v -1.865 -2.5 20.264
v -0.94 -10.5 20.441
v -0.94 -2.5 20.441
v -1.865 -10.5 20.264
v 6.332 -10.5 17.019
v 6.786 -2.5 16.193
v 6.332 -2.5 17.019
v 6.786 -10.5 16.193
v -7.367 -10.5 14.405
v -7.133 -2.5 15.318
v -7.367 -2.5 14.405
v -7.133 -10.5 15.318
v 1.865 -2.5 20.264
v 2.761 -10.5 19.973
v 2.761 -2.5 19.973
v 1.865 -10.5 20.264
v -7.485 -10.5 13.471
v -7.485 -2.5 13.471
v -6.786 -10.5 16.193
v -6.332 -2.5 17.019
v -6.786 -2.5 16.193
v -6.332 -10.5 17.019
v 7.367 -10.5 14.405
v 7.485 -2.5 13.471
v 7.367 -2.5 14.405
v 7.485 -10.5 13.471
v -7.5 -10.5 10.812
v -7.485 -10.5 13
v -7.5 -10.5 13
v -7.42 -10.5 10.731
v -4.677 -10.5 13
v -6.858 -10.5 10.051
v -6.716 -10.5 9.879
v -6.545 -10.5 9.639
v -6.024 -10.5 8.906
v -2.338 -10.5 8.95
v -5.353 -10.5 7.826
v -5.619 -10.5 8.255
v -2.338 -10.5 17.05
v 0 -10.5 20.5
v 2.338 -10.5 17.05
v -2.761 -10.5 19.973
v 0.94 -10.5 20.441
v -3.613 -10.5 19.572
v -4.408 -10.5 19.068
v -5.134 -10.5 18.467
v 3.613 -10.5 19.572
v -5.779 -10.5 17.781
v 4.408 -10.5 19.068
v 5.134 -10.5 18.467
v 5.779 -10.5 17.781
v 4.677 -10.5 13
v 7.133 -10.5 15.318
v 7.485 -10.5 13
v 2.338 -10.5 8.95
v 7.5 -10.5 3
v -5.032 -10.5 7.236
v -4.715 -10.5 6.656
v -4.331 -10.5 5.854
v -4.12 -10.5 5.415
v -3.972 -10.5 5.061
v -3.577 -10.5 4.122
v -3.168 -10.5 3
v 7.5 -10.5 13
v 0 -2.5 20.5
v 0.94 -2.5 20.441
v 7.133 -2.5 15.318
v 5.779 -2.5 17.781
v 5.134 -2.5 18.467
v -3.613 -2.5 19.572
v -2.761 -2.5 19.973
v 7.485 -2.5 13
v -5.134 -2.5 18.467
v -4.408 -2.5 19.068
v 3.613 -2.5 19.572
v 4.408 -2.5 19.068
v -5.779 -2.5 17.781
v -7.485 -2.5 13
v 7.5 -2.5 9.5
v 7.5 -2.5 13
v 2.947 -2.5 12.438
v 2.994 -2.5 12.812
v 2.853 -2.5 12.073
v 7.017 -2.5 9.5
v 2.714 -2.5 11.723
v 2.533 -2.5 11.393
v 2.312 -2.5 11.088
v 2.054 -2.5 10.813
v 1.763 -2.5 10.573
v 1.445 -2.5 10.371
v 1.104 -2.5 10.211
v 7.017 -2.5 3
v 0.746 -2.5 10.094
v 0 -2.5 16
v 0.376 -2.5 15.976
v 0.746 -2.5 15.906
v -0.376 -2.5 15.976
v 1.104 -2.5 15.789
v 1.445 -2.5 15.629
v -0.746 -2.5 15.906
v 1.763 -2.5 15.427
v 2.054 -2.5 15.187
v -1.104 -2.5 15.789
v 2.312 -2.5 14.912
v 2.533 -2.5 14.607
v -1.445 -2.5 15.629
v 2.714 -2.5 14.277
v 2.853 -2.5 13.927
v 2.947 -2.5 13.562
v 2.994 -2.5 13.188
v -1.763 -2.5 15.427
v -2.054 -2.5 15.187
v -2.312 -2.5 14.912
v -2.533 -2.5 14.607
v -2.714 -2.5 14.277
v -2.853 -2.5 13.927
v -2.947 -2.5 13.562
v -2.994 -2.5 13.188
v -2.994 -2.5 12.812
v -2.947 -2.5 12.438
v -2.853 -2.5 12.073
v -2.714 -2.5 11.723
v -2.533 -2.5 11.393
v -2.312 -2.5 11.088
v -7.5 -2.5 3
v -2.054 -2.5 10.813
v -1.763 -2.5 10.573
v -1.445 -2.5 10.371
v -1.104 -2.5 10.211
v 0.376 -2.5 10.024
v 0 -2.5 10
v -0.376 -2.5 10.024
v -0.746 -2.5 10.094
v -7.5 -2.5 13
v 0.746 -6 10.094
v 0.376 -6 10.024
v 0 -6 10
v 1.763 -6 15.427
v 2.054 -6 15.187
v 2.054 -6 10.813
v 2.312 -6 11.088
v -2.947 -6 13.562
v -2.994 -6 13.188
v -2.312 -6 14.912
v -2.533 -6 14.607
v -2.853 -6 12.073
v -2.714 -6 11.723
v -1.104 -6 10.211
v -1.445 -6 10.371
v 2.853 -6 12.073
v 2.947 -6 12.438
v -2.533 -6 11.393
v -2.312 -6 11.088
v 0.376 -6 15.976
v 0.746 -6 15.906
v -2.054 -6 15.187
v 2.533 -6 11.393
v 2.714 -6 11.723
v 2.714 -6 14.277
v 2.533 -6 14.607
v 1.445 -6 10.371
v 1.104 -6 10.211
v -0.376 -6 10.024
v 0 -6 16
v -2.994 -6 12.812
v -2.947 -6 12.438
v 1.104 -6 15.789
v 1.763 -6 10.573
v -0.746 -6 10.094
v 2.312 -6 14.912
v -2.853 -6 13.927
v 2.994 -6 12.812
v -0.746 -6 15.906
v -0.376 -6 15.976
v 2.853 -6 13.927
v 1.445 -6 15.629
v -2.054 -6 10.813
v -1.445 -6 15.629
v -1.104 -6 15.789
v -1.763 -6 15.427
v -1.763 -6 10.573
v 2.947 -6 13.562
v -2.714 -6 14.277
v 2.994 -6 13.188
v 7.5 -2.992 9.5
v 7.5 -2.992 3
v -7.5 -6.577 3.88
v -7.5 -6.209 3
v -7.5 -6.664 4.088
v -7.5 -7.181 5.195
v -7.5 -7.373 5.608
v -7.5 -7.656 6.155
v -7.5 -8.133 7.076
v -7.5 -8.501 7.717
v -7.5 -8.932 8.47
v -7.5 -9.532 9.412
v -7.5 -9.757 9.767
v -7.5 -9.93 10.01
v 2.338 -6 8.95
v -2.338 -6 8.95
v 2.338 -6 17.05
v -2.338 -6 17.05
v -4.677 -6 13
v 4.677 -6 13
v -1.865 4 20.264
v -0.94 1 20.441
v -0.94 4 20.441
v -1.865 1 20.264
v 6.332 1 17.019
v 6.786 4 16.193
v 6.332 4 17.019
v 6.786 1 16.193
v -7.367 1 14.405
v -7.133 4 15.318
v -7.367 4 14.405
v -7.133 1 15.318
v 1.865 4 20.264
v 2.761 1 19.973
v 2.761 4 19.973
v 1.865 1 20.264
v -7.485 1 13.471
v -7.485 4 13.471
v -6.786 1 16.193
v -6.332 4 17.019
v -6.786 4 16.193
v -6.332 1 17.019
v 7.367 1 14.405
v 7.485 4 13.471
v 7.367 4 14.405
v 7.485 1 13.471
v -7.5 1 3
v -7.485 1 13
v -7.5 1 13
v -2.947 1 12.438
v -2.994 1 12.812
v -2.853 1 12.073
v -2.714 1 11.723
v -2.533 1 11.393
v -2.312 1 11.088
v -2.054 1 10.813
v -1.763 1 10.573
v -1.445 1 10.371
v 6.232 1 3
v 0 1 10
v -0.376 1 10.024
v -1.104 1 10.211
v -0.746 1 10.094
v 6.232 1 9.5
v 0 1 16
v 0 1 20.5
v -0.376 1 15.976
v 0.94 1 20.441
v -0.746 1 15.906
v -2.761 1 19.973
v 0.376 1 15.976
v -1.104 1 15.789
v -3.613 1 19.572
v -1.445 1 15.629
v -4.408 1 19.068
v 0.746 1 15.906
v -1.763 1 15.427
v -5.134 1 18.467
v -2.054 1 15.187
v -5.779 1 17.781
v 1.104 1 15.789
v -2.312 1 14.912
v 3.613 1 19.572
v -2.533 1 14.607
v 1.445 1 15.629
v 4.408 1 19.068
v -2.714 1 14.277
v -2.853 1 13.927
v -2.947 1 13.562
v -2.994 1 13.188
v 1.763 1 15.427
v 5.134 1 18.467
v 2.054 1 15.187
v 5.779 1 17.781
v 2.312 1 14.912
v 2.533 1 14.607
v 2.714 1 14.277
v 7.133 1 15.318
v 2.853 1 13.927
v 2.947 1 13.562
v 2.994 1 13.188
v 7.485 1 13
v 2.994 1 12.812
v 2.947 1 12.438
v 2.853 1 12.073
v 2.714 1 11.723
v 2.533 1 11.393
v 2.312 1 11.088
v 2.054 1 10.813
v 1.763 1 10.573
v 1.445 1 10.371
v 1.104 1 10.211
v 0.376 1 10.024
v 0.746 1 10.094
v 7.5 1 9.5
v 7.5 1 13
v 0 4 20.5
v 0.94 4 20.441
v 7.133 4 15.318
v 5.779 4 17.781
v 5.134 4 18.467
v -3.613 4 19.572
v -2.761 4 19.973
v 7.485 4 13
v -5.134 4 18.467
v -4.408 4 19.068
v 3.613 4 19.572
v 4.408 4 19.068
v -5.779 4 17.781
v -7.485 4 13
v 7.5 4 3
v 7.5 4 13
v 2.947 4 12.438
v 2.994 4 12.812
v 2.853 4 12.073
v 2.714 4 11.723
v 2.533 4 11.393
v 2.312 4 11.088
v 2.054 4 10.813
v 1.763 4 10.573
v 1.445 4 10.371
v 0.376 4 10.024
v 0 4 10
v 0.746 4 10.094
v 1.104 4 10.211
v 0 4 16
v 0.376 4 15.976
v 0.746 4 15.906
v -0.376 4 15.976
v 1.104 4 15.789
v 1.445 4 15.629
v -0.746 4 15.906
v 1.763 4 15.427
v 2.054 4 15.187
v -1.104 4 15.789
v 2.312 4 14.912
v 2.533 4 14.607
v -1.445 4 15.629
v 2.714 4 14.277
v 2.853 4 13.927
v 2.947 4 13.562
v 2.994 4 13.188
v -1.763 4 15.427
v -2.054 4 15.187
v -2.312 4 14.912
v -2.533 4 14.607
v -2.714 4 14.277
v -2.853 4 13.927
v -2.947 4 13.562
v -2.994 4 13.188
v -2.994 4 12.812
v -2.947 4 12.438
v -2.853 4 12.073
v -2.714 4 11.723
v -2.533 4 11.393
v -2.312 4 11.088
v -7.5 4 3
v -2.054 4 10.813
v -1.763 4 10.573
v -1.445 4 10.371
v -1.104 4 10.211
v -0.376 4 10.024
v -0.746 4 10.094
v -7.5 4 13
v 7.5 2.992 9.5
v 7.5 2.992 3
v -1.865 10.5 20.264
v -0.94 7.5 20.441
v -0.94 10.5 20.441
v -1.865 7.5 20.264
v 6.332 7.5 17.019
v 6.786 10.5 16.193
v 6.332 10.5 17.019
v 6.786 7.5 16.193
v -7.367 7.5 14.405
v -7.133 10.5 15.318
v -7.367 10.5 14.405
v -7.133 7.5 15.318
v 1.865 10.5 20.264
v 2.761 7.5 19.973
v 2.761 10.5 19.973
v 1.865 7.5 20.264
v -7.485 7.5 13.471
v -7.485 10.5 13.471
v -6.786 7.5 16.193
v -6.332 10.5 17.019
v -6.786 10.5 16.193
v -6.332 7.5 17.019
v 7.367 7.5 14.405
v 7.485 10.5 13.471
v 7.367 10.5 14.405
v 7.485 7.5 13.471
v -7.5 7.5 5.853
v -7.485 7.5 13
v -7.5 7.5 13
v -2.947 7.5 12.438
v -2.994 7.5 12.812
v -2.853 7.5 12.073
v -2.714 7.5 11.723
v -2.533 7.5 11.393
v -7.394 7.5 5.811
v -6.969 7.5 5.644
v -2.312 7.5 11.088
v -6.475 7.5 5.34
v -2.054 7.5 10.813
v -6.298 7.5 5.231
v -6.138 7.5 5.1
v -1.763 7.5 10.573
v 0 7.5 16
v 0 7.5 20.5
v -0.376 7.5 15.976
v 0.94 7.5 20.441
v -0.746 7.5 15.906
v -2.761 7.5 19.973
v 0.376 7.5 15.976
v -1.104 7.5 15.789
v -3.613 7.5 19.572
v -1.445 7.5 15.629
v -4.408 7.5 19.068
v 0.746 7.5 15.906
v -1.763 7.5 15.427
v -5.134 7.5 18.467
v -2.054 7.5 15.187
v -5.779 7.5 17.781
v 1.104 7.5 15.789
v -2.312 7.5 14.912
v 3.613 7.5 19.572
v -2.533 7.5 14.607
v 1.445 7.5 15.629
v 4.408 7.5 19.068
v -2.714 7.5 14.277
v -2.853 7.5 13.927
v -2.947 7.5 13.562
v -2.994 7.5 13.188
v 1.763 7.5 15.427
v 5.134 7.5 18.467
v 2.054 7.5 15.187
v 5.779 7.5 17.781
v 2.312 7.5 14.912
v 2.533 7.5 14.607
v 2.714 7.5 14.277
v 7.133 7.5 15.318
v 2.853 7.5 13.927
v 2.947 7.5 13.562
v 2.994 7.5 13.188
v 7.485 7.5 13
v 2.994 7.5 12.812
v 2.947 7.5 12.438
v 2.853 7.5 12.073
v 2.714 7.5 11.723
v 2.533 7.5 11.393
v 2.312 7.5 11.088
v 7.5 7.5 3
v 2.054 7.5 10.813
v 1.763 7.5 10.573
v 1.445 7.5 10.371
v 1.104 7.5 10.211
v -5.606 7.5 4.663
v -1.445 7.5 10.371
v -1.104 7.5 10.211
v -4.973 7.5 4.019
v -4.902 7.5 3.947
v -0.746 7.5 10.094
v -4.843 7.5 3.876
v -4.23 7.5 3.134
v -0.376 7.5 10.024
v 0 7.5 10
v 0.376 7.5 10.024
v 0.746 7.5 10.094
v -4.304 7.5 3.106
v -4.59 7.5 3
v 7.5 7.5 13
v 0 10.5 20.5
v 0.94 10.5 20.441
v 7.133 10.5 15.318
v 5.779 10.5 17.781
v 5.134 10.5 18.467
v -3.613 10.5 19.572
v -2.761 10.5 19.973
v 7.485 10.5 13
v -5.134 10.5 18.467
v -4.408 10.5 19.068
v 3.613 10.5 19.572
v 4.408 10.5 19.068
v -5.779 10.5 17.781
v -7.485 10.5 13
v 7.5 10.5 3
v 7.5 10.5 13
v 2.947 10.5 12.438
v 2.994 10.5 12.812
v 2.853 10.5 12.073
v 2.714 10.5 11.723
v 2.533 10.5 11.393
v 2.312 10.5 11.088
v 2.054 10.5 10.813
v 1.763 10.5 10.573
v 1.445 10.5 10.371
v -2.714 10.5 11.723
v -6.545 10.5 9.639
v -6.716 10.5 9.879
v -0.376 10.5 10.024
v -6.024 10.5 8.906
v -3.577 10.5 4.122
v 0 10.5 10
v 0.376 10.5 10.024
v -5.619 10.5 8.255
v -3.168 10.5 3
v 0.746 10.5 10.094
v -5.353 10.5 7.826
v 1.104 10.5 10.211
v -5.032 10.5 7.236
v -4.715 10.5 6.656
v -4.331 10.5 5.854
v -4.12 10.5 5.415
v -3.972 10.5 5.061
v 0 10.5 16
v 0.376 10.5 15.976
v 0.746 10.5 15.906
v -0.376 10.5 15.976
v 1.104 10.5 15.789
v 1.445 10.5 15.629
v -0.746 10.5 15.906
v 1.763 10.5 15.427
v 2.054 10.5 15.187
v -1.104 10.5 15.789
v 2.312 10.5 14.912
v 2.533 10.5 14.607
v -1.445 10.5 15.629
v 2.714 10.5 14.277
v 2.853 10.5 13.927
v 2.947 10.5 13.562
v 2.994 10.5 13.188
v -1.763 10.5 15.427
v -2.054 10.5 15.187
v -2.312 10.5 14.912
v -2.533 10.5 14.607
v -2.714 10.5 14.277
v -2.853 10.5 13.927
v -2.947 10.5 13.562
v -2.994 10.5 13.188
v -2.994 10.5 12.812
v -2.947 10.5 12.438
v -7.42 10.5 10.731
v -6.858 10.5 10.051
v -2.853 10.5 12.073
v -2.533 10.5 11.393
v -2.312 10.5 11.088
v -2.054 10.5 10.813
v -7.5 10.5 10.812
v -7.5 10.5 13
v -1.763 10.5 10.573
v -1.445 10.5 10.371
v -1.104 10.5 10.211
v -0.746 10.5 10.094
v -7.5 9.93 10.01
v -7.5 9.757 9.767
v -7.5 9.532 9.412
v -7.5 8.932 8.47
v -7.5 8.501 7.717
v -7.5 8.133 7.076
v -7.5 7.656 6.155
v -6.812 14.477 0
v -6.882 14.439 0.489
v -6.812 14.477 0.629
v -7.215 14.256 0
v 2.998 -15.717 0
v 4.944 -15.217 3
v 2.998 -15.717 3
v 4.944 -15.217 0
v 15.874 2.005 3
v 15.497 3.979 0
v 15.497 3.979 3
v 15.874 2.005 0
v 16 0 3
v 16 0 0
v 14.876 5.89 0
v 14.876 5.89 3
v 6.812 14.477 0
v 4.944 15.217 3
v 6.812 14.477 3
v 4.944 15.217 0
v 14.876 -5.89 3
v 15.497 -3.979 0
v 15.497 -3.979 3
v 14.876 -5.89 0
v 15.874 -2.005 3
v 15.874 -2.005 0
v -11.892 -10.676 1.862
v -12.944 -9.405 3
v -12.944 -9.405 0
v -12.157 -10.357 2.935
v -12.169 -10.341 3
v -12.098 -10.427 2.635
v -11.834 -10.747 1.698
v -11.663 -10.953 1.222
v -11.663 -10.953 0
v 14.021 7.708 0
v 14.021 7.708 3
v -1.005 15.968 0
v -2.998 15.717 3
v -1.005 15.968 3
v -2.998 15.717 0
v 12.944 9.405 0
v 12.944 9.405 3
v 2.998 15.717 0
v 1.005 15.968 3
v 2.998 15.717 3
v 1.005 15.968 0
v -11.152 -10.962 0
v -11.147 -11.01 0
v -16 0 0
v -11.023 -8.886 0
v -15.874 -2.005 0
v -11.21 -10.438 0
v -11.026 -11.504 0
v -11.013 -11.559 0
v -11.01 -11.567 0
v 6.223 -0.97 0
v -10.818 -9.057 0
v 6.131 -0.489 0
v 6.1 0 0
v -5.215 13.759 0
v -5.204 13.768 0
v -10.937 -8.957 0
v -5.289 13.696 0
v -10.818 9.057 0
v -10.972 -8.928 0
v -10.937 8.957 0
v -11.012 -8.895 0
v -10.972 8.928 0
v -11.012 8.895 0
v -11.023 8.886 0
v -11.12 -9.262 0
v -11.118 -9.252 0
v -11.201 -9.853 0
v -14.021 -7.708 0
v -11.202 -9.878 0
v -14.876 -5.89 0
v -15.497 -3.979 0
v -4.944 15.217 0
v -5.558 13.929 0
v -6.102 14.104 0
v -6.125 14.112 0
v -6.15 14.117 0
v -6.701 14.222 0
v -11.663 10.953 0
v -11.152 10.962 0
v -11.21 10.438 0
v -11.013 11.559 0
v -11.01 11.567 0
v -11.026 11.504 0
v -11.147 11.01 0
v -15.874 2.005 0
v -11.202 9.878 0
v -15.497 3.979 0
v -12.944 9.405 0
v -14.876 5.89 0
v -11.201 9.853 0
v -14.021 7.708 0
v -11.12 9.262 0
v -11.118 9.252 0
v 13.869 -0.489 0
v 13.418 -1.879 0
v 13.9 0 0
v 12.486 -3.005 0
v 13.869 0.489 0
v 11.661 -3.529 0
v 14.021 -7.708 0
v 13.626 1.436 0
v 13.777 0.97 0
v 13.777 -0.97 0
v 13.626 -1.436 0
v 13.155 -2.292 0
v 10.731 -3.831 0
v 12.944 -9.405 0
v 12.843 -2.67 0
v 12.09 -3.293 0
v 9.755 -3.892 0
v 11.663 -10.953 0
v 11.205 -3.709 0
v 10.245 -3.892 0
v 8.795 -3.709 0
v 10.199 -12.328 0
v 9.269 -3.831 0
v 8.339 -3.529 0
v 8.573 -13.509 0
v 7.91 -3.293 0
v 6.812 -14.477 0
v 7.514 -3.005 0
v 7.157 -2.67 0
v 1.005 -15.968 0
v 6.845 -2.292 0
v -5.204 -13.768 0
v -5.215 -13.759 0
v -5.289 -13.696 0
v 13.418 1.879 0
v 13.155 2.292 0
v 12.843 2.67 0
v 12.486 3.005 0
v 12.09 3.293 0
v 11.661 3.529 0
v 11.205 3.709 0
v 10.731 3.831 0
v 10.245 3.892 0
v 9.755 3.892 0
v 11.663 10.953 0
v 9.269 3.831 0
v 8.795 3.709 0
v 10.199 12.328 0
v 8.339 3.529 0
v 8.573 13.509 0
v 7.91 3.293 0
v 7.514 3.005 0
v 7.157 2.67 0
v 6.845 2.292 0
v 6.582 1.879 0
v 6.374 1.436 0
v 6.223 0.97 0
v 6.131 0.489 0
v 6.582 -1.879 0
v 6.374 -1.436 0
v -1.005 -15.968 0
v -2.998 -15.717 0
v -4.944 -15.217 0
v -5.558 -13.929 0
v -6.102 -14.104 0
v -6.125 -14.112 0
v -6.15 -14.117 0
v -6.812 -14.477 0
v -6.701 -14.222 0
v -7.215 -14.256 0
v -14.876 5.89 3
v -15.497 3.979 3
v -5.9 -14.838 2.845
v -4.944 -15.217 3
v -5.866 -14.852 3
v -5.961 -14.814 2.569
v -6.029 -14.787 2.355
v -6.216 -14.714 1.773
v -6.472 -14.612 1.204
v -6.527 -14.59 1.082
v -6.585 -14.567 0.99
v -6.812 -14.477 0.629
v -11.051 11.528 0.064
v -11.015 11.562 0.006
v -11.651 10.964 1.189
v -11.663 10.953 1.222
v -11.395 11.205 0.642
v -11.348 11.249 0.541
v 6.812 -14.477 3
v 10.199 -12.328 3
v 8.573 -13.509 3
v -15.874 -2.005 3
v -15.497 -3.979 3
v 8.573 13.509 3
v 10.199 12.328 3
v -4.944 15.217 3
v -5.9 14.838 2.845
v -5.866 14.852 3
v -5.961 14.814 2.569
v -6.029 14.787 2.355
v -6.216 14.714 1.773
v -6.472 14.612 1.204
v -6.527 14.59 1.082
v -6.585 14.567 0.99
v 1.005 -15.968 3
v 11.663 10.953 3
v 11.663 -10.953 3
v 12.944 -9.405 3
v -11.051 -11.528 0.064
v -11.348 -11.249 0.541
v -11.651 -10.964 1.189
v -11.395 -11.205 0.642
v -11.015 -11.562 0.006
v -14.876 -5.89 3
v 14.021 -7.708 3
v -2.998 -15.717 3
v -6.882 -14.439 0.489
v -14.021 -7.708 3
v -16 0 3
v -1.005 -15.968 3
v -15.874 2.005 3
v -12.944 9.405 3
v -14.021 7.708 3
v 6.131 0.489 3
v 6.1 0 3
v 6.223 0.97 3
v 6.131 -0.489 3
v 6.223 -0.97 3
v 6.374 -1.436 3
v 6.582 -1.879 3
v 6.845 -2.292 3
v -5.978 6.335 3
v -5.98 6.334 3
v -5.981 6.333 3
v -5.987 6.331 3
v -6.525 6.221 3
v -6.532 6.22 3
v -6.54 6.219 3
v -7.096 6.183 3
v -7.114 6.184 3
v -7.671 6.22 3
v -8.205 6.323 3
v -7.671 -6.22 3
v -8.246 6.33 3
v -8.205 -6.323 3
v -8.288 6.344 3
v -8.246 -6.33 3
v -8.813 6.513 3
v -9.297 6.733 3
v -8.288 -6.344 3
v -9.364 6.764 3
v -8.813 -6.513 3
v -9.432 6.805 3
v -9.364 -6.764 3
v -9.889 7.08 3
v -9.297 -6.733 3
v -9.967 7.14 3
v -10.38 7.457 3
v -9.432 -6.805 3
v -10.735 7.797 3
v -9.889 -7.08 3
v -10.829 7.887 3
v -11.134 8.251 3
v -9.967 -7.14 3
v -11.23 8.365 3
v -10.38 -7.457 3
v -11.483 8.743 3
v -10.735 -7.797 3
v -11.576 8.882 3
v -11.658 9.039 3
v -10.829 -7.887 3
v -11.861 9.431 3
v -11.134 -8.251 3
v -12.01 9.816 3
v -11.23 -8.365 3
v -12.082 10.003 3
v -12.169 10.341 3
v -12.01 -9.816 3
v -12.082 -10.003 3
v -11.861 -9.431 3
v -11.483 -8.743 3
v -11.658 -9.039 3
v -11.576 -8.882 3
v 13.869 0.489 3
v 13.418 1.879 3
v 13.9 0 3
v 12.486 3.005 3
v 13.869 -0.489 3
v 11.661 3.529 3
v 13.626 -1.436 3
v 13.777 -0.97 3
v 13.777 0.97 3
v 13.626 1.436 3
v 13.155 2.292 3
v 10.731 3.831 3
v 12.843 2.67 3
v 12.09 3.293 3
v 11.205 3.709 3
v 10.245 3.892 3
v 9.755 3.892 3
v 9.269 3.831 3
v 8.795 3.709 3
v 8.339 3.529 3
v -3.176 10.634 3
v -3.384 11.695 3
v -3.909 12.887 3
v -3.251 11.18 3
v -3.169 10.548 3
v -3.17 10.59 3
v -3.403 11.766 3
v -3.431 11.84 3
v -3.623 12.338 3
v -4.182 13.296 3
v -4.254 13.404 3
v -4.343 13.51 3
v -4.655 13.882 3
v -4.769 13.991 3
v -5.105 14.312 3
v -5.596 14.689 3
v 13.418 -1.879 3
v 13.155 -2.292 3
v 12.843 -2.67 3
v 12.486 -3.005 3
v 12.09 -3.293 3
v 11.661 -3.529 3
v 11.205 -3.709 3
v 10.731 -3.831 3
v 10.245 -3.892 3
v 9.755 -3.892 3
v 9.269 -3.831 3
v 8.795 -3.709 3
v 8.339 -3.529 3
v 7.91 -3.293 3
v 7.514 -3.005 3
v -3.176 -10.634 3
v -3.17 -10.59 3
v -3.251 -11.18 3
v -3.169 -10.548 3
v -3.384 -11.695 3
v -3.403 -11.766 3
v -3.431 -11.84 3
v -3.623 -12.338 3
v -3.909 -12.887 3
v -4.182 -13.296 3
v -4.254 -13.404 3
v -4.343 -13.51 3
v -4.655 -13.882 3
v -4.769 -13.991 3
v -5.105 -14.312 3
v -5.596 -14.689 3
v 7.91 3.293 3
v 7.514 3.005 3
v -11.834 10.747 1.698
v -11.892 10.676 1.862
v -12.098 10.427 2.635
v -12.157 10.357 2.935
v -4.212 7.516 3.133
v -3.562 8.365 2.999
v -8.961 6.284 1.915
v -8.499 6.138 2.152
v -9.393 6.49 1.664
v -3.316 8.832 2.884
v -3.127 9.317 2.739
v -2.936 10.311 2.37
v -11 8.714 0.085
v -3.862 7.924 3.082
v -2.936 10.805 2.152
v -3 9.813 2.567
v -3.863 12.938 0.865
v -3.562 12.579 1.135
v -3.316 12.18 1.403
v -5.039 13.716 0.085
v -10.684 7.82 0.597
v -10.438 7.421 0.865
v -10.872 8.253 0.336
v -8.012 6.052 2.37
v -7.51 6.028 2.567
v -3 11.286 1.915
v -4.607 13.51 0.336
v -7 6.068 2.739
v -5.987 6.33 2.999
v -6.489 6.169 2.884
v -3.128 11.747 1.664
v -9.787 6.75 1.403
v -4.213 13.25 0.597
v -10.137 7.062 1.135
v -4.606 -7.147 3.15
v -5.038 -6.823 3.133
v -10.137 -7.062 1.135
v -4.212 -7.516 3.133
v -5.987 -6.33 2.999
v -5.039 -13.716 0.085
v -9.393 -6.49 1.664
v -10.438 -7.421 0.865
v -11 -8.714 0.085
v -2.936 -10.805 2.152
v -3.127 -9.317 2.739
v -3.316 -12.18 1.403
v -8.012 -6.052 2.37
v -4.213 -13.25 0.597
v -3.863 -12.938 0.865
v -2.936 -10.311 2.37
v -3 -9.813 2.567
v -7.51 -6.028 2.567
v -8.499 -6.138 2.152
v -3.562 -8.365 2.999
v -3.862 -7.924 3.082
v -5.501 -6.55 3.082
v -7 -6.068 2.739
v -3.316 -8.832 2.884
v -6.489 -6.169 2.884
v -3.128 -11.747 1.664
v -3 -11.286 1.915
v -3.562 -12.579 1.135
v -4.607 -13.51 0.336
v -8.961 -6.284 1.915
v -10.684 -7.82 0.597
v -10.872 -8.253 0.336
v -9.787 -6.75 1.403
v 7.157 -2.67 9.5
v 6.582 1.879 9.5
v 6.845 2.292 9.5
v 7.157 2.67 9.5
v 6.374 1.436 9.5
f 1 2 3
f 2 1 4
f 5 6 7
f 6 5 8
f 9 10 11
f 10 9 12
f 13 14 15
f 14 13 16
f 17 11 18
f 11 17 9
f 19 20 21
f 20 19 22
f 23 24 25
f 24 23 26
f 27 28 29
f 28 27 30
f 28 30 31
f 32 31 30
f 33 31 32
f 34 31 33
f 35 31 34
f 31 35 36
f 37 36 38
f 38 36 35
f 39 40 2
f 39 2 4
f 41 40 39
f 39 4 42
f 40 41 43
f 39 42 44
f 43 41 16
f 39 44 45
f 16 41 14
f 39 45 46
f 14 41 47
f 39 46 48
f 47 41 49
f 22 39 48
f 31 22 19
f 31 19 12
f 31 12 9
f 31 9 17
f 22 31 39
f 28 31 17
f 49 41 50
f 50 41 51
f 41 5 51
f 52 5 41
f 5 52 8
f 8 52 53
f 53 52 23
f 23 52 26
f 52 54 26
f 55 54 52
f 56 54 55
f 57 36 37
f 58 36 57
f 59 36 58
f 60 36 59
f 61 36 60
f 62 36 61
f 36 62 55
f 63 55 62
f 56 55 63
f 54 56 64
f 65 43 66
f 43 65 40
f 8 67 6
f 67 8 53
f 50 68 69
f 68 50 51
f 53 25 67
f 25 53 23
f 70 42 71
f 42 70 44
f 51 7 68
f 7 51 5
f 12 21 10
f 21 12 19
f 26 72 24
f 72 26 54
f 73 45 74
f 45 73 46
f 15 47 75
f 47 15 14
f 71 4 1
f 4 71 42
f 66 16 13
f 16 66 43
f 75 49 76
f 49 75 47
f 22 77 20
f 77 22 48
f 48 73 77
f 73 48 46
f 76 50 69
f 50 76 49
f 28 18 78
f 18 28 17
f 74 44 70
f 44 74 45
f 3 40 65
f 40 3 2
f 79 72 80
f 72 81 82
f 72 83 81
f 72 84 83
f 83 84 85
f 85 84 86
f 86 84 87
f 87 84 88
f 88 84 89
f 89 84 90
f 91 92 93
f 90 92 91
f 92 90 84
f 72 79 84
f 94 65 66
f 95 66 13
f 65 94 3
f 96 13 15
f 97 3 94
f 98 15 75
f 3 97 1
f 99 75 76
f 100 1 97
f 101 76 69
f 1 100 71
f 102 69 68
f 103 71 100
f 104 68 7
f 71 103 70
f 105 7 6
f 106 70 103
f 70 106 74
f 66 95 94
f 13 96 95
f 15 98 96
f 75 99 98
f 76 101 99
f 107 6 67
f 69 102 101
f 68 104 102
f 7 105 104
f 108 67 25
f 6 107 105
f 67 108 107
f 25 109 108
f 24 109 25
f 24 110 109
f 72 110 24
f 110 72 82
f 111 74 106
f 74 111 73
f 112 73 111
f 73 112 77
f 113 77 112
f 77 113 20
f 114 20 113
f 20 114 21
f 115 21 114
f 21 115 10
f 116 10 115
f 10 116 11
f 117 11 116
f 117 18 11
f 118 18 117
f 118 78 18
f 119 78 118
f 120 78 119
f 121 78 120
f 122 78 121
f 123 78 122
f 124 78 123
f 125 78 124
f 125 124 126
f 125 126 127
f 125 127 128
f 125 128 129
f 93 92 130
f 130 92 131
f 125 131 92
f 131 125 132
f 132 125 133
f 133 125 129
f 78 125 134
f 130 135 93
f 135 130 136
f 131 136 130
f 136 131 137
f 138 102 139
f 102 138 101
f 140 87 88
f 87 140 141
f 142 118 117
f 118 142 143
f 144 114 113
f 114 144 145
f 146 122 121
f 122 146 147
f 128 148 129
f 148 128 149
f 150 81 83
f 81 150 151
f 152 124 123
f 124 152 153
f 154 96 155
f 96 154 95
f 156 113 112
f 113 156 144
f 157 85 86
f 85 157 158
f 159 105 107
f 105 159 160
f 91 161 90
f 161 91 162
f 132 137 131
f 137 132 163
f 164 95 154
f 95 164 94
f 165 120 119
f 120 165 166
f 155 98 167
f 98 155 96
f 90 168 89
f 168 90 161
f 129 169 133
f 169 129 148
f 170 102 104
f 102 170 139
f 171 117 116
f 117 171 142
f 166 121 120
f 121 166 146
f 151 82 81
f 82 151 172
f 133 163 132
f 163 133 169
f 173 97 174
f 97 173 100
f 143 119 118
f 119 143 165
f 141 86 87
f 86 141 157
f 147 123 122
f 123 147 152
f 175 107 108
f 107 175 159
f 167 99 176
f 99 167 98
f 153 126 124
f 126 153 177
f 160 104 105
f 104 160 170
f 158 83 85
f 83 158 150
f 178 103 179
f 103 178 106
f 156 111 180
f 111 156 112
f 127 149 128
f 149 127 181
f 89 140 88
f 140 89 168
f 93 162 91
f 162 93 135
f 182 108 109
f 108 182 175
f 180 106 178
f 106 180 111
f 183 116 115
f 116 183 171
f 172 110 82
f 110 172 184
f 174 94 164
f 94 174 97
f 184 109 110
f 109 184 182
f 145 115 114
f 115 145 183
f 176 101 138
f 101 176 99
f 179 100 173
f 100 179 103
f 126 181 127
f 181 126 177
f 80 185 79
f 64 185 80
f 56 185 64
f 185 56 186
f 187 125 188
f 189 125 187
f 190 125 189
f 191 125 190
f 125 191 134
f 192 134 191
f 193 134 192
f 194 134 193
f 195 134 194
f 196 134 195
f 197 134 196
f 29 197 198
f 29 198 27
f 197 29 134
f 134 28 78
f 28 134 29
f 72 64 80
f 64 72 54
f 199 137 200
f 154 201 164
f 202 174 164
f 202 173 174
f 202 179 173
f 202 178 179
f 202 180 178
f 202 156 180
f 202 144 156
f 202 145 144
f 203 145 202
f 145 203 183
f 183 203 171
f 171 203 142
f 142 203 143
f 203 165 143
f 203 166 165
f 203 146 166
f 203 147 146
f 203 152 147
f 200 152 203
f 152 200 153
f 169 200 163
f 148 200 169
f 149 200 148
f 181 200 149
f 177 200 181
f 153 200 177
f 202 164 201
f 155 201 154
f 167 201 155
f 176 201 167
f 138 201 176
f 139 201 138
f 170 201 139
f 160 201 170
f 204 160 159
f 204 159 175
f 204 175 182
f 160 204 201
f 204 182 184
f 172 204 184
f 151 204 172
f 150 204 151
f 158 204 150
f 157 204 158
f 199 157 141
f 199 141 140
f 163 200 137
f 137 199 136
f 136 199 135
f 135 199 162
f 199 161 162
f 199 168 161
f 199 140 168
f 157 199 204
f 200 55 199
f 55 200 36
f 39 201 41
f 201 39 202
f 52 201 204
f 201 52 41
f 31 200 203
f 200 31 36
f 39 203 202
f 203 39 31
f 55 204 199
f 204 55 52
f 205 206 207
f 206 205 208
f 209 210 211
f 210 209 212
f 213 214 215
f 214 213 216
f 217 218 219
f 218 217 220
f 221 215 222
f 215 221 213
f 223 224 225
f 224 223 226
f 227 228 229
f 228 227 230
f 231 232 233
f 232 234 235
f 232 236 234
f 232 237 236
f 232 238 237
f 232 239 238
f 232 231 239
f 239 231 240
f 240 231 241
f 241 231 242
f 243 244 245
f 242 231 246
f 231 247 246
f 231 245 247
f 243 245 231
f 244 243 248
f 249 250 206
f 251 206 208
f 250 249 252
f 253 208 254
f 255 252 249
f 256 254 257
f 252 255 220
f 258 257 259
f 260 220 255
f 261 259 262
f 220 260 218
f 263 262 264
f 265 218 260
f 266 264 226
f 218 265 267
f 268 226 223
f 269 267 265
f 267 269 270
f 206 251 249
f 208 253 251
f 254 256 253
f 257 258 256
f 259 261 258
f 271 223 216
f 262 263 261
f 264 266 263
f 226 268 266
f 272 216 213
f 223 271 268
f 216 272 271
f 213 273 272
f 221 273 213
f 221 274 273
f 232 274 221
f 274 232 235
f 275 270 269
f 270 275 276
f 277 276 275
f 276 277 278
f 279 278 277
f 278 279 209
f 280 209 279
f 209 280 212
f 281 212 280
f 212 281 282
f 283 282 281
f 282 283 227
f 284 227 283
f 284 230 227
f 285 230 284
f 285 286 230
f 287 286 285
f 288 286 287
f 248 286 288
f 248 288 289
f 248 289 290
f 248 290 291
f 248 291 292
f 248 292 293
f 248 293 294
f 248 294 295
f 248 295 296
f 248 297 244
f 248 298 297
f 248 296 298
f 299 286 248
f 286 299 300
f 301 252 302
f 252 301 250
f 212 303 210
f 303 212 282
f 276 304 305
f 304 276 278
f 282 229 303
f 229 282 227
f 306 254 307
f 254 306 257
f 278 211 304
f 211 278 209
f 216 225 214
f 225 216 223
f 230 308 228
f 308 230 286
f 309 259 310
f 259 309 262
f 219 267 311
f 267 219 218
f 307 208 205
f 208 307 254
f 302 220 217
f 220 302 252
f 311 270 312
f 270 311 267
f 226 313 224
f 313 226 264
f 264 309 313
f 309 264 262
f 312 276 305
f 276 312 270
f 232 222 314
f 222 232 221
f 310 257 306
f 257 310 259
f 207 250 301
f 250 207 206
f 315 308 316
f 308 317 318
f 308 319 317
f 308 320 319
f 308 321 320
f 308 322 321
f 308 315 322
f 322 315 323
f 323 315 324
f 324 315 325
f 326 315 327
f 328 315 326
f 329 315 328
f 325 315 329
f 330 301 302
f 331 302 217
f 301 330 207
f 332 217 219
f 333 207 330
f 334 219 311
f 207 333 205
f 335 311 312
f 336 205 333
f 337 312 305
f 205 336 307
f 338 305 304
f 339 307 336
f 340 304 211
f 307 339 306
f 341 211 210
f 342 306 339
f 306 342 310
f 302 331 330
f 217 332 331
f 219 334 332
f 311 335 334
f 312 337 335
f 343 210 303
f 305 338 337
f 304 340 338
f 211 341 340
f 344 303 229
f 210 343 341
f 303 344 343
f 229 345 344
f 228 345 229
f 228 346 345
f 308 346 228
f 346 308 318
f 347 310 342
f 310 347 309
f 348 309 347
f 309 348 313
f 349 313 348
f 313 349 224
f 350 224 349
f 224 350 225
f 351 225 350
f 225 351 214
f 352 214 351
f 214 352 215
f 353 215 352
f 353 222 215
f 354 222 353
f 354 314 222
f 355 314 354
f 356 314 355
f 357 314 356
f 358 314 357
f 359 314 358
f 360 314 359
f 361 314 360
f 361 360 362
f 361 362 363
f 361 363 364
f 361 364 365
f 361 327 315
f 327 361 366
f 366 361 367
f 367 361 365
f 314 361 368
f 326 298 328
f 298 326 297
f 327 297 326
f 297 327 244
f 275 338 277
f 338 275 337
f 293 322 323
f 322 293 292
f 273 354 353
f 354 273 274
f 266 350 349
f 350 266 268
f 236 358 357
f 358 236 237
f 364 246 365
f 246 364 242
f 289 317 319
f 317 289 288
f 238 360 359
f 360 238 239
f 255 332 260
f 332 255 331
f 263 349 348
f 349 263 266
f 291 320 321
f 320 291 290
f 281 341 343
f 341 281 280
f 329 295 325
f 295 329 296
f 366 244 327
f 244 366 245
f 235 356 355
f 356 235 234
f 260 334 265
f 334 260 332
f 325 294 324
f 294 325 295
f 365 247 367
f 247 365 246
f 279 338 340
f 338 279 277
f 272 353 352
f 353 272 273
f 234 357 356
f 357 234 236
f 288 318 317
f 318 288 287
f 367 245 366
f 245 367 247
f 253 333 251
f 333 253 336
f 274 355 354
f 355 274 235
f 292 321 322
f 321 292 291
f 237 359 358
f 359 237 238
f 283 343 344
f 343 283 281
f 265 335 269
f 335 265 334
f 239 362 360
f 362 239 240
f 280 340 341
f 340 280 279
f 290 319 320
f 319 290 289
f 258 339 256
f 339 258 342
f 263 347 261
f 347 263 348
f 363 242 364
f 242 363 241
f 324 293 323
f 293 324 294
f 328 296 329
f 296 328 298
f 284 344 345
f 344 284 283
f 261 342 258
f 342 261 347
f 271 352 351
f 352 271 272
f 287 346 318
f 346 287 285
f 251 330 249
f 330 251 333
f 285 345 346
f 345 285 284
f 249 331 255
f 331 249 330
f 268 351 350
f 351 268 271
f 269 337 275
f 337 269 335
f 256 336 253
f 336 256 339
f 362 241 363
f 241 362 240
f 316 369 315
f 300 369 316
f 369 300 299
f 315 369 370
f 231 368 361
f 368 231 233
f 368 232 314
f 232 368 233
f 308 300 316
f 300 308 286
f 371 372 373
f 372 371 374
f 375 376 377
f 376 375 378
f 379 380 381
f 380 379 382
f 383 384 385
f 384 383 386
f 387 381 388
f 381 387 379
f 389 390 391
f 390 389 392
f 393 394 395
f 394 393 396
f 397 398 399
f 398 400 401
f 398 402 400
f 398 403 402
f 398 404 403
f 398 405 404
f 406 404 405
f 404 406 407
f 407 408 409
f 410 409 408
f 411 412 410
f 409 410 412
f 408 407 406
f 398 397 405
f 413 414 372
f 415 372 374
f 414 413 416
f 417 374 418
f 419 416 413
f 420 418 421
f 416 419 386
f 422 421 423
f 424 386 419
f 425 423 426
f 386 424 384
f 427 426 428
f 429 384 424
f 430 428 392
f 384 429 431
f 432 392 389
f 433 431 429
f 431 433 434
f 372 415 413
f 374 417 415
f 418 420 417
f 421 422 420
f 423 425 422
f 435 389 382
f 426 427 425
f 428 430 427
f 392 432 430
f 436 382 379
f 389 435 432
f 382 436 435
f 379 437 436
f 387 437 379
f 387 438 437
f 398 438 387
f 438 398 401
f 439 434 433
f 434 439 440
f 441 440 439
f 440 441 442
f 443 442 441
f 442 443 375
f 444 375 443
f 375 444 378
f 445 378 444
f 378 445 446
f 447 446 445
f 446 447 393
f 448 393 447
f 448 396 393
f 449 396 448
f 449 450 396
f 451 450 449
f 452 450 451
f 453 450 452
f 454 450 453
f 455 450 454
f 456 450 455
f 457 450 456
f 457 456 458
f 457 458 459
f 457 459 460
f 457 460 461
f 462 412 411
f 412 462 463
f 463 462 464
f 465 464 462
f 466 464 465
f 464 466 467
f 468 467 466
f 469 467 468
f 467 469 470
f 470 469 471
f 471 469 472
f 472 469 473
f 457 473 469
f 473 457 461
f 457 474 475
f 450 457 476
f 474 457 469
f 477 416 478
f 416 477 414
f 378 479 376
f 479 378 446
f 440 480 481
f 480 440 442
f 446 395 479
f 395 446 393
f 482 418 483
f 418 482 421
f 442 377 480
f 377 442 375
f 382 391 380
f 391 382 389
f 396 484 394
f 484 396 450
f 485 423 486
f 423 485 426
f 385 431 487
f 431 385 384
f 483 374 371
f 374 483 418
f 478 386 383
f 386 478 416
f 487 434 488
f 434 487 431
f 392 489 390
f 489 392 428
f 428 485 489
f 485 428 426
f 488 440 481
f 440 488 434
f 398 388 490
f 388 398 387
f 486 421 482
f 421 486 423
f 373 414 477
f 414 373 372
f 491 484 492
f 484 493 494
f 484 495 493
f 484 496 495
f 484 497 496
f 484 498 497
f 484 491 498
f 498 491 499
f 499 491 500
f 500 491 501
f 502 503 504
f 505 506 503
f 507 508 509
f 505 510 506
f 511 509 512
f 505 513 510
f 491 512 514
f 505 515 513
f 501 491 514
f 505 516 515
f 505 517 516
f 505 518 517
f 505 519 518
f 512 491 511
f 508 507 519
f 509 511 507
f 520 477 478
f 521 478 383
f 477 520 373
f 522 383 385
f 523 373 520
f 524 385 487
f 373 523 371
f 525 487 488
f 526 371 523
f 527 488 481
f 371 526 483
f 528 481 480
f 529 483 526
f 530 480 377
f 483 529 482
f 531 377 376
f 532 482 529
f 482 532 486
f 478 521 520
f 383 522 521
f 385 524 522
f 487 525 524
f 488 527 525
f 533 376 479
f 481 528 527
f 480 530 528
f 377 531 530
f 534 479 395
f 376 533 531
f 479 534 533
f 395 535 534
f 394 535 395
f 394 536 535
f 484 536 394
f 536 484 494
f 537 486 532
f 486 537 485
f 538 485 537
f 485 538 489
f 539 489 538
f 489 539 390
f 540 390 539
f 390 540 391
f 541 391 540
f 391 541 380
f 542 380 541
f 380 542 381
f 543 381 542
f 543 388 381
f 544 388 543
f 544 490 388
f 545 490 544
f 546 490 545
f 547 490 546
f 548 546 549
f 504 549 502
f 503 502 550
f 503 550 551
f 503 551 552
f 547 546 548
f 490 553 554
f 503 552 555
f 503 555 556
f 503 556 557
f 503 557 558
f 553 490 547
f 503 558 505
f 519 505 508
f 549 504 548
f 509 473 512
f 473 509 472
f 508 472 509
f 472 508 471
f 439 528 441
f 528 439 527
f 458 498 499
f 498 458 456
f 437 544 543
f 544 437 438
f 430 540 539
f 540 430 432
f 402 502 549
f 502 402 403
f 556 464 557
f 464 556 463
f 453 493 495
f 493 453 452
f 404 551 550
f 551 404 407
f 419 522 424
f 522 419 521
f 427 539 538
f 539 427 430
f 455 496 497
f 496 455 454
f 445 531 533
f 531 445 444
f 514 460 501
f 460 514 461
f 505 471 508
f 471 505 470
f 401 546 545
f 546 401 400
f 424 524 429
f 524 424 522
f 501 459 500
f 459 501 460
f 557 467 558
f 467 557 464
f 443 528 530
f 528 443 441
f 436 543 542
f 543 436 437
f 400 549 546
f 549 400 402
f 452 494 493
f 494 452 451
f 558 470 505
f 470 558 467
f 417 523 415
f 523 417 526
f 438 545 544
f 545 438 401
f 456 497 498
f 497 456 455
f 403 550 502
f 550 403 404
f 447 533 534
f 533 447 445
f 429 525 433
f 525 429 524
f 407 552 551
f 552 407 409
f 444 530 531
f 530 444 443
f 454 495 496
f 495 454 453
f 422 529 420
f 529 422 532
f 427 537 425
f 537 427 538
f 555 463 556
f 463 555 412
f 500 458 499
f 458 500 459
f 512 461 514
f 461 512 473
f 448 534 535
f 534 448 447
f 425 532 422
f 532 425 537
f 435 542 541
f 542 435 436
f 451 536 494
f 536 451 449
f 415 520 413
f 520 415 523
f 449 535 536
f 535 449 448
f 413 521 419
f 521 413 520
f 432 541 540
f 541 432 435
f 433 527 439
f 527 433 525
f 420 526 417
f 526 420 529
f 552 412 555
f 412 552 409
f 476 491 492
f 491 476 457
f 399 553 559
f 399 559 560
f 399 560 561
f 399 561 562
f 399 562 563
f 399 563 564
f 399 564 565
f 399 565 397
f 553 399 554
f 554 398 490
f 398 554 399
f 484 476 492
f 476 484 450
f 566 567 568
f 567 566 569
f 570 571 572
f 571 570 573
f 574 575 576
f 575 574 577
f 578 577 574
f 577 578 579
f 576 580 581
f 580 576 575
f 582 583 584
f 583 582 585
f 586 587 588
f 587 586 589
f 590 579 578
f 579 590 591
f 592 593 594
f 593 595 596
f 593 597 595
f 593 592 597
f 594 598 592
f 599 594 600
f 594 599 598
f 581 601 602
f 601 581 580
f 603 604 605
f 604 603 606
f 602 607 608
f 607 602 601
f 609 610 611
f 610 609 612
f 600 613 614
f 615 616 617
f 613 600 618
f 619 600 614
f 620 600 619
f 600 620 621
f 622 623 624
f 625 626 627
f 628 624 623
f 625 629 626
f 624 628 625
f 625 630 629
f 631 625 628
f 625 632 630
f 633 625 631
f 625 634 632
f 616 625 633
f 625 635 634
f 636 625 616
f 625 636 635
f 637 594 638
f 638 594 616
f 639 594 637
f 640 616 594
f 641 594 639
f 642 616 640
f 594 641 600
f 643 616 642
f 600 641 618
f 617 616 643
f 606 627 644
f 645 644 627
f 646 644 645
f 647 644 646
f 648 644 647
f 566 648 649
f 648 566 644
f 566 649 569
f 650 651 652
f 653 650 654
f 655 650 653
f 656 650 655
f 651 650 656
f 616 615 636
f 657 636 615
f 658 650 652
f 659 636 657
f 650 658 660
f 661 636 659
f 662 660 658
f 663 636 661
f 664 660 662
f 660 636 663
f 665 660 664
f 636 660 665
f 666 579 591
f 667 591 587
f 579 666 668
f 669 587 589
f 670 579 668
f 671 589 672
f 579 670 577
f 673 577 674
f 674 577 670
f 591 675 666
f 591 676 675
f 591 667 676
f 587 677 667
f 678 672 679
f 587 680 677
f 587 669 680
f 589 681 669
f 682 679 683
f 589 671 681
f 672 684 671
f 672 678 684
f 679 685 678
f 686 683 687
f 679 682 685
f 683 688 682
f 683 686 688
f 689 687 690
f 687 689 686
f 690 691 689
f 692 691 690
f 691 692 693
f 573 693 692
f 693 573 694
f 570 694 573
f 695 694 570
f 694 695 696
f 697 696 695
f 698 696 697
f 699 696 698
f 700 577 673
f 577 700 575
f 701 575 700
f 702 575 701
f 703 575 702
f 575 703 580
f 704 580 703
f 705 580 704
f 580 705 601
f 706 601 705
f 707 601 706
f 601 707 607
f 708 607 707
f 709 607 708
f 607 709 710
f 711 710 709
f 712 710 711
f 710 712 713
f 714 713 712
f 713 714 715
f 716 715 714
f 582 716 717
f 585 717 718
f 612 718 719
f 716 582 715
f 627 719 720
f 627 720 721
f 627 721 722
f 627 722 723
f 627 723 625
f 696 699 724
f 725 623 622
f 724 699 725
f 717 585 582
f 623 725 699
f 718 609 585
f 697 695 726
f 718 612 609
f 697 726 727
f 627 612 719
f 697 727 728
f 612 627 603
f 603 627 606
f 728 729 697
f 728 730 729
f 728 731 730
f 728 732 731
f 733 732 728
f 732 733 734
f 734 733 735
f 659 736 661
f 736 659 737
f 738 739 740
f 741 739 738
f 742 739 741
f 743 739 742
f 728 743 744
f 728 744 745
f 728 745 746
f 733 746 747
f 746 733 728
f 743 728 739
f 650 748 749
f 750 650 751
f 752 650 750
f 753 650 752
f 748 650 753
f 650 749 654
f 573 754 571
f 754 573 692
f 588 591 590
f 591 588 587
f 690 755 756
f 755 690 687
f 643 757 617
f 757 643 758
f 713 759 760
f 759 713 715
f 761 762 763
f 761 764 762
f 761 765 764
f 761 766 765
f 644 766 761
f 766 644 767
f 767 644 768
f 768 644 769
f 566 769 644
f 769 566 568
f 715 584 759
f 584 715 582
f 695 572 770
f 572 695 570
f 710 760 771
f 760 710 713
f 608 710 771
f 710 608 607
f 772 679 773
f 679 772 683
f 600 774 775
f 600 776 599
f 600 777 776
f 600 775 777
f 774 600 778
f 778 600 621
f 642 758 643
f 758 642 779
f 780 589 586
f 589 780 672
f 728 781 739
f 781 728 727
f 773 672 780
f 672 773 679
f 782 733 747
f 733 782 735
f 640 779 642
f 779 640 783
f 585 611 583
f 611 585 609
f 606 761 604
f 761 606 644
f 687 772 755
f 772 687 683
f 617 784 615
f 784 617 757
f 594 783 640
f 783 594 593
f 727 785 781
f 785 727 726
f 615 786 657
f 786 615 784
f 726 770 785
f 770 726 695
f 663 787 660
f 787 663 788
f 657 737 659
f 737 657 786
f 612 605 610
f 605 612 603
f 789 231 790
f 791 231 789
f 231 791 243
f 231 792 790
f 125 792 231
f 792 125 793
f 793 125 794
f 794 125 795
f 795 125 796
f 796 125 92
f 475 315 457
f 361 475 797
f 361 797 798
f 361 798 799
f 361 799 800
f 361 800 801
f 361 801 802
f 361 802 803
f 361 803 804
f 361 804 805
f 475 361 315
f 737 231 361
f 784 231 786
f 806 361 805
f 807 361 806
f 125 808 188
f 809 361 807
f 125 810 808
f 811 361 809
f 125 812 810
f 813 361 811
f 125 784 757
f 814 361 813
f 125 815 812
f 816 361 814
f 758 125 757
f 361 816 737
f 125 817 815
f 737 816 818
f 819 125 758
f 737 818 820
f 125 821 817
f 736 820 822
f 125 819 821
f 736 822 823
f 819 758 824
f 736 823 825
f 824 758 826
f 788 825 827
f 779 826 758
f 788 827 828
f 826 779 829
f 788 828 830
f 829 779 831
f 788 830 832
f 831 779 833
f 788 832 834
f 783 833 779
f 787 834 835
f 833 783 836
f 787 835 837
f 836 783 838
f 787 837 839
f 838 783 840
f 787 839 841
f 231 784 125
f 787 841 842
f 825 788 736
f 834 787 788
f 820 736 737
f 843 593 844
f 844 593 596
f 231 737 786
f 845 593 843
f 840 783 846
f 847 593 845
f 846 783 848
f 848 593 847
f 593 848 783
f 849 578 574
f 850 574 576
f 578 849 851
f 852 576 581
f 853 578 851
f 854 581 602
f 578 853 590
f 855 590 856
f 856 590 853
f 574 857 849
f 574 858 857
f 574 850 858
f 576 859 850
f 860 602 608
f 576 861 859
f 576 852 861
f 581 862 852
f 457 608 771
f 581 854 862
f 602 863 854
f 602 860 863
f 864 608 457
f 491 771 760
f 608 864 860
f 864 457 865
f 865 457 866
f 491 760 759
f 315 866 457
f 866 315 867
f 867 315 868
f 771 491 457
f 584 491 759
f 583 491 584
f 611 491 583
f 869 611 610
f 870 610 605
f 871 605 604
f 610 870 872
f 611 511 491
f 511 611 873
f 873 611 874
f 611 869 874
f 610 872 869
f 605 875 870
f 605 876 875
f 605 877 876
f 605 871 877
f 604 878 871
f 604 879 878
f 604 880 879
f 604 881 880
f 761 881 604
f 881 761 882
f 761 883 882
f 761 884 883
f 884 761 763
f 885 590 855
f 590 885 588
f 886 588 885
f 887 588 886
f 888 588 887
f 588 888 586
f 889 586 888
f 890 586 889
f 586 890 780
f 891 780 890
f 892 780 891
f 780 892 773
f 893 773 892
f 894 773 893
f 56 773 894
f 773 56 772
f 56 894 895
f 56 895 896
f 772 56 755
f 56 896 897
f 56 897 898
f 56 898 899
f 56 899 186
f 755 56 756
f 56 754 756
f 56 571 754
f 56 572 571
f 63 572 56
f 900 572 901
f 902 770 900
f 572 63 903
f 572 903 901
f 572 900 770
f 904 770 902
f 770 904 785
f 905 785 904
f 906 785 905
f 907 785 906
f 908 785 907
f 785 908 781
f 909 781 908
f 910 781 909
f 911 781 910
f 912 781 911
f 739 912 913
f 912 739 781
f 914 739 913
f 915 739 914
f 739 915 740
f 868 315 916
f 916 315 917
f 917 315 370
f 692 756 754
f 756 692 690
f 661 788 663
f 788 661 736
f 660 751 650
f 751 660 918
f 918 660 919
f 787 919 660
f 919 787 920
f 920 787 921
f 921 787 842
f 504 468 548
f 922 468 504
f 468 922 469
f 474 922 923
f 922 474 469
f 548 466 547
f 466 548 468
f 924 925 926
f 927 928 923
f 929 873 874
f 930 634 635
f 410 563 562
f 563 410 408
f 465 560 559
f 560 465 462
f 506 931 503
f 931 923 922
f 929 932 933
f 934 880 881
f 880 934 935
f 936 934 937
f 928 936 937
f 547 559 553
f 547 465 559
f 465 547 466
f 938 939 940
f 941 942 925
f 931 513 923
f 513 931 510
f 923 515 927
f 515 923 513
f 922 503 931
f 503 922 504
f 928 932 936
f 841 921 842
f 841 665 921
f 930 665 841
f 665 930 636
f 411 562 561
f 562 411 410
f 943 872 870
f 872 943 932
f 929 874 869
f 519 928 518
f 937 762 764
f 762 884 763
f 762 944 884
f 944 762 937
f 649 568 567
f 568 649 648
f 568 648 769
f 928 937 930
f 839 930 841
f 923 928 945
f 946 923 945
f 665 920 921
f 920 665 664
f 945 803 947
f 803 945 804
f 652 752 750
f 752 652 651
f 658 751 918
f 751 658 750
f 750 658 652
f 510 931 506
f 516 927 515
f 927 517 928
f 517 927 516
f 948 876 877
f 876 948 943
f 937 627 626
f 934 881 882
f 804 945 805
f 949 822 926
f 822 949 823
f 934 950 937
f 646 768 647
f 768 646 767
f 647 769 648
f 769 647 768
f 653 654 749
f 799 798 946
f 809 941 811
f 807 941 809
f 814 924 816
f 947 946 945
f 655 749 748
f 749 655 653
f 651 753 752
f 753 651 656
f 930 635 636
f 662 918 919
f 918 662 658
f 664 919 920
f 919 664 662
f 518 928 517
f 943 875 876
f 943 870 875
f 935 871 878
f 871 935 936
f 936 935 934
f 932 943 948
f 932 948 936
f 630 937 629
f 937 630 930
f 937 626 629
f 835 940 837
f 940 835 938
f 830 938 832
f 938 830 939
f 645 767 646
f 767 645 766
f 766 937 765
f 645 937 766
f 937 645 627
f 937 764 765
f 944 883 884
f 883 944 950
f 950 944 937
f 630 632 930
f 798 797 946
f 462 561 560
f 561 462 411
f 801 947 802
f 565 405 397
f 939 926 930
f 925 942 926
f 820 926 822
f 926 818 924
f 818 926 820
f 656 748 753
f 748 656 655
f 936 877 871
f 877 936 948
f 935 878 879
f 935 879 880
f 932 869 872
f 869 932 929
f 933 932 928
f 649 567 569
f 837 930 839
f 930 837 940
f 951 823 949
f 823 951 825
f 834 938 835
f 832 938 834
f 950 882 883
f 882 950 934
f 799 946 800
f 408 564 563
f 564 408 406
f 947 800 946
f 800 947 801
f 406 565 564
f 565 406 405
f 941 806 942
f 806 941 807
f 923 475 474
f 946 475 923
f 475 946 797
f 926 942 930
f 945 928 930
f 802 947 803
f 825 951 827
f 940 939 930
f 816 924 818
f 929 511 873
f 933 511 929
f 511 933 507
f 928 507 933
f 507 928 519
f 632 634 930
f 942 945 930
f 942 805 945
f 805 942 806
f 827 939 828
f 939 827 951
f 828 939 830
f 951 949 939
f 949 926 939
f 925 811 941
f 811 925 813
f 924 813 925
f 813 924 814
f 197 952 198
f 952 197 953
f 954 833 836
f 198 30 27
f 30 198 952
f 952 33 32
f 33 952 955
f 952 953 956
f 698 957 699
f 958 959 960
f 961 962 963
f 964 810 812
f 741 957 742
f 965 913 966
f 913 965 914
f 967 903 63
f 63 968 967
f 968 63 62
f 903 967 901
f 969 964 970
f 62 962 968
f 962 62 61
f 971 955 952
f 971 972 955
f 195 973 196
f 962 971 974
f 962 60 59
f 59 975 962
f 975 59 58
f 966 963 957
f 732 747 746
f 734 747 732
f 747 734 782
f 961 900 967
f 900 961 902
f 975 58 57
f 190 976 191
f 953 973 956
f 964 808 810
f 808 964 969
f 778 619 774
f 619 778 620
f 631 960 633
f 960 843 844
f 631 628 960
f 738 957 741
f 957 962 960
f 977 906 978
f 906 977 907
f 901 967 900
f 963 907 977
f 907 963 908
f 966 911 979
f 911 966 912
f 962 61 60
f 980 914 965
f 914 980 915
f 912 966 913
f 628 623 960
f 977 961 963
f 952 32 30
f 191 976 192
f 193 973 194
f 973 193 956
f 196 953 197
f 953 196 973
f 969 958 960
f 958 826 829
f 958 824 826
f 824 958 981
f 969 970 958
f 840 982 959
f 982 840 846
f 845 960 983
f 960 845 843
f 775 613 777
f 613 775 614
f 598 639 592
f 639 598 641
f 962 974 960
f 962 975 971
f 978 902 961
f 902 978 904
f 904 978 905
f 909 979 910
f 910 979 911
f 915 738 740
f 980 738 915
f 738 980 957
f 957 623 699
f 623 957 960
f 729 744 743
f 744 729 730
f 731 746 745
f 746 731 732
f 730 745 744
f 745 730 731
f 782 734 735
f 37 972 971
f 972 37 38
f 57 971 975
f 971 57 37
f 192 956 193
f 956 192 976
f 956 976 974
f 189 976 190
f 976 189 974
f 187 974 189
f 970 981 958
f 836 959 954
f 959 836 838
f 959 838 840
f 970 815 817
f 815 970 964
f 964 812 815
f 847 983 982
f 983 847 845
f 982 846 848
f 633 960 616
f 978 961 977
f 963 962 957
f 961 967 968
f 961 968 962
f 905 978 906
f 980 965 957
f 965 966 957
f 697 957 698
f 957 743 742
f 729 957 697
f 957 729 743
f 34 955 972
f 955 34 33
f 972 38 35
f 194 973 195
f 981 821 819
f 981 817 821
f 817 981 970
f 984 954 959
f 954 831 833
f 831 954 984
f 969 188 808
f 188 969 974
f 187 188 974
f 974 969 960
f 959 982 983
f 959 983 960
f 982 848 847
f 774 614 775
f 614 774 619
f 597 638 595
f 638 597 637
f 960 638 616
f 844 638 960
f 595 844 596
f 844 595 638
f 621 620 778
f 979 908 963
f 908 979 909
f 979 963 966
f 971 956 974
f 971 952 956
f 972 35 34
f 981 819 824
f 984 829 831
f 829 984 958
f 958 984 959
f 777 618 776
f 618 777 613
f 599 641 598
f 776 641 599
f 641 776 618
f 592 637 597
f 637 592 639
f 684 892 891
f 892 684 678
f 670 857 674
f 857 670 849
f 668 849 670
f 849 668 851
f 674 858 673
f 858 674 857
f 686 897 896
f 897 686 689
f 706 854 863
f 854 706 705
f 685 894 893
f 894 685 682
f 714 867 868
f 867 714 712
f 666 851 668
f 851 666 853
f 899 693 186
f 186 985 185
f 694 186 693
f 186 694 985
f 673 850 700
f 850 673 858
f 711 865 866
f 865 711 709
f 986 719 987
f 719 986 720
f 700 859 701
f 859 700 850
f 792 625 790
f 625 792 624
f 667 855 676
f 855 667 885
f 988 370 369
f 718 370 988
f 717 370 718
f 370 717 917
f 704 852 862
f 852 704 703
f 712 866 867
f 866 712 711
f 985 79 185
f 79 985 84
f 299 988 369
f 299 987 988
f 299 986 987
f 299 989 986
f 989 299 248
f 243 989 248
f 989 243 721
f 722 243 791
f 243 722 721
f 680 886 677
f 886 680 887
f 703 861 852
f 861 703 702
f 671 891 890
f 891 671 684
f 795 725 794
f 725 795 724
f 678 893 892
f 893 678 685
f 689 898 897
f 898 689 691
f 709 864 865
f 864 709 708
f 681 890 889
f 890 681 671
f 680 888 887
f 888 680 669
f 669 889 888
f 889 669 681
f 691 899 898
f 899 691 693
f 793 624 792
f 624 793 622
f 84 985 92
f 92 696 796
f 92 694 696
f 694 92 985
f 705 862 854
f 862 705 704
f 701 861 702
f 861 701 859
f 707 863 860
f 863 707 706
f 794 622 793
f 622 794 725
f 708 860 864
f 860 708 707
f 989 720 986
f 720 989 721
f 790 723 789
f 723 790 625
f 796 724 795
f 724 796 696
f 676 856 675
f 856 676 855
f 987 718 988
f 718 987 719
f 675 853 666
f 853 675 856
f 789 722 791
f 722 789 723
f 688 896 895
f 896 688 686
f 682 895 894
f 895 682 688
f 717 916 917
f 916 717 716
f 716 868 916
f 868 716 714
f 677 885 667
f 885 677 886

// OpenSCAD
// file: GoPro_Mount.scad
$fa = 2;
$fs = 0.25;
Extra_Mount_Depth = 3;

module nut_hole()
{
	rotate([0, 90, 0]) // (Un)comment to rotate nut hole
	rotate([90, 0, 0])
		for(i = [0:(360 / 3):359])
		{
			rotate([0, 0, i])
				cube([4.6765, 8.1, 5], center = true);
		}
}

module flap(Width)
{
	rotate([90, 0, 0])
	union()
	{
		translate([3.5, (-7.5), 0])
			cube([4 + Extra_Mount_Depth, 15, Width]);


		translate([0, (-7.5), 0])
			cube([7.5 + Extra_Mount_Depth, 4, Width]);

		translate([0, 3.5, 0])
			cube([7.5 + Extra_Mount_Depth, 4, Width]);

		difference()
		{
			cylinder(h = Width, d = 15);

			translate([0, 0, (-1)])
				cylinder(h = Width + 2, d = 6);
		}
	}
}

module mount2()
{
	union()
	{

			translate([0, 4, 0])
		flap(3);

		translate([0, 10.5, 0])
		flap(3);
	}
}

module mount3()
{
	union()
	{
		difference()
		{
			translate([0, (-2.5), 0])
				flap(8);

			translate([0, (-8.5), 0])
				nut_hole();
		}

		mount2();
	}
}

/* GoPro Mount - 2 flap no nut hole
translate([0, 0, 10.5])
	rotate([0, 90, 0])
		mount2();
// */

/* GoPro Mount - 3 flap w/nut hole
translate([0, 0, 10.5])
	rotate([0, 90, 0])
		mount3();
*/
// main file
include <GoPro_Mount.scad>

offset=.5;
diskHeight=3;
$fn = 50; // Smoothness
screw_rad = 3.2 / 2; // M3 clearance
head_rad = 8.0 / 2; // Head diameter + tolerance
head_height = 2.0; // Depth of inset
total_height = 20;


difference() {
    difference() {
      union() {
        translate([0, 0, 13])
            rotate([0, 90, 0])
                    mount3();
        // base
        cylinder(h=diskHeight, r=16);
      }

        for (x = [1, -1]) {
          translate([-7.0, 10.00 * x, diskHeight-2]) {
           rotate([00, -30, -50 * x]) color("LightBlue")
             cylinder(h=10, r=4.3, center=false);
          }
        }
        translate([10,0, -offset])
          cylinder(h=10, r=3.9, center=false);

    }
}
        /*
        translate([-7,-10,-offset]) {
            color("LightBlue") cylinder(h=diskHeight + .75, r=screw_rad);
            translate([0,0,diskHeight - head_height + offset + .1])
             color("LightBlue") cylinder(h=head_height, r1=screw_rad, r2=head_rad);
        }
        translate([-7,10,-offset]) {
            color("LightBlue") cylinder(h=diskHeight + .75, r=screw_rad);
            translate([0,0,diskHeight - head_height + offset + .1])
             color("LightBlue") cylinder(h=head_height, r1=screw_rad, r2=head_rad);
        }
        translate([10,0,-offset]) {
            color("LightBlue") cylinder(h=diskHeight + .75, r=screw_rad);
            translate([0,0,diskHeight - head_height + offset + .1])
              color("LightBlue") cylinder(h=head_height, r1=screw_rad, r2=head_rad);
        }
    }
}

/*
difference() {
  cylinder(h=diskHeight, r=16);
  union() {
    translate([-7,-10,-offset]) {
        color("LightBlue") cylinder(h=diskHeight + .75, r=screw_rad);
        translate([0,0,diskHeight - head_height + offset + .1])
         color("LightBlue") cylinder(h=head_height, r1=screw_rad, r2=head_rad);
    }
    translate([-7,10,-offset]) {
        color("LightBlue") cylinder(h=diskHeight + .75, r=screw_rad);
        translate([0,0,diskHeight - head_height + offset + .1])
         color("LightBlue") cylinder(h=head_height, r1=screw_rad, r2=head_rad);
    }
    translate([10,0,-offset]) {
        color("LightBlue") cylinder(h=diskHeight + .75, r=screw_rad);
        translate([0,0,diskHeight - head_height + offset + .1])
          color("LightBlue") cylinder(h=head_height, r1=screw_rad, r2=head_rad);
    }
}

*/
